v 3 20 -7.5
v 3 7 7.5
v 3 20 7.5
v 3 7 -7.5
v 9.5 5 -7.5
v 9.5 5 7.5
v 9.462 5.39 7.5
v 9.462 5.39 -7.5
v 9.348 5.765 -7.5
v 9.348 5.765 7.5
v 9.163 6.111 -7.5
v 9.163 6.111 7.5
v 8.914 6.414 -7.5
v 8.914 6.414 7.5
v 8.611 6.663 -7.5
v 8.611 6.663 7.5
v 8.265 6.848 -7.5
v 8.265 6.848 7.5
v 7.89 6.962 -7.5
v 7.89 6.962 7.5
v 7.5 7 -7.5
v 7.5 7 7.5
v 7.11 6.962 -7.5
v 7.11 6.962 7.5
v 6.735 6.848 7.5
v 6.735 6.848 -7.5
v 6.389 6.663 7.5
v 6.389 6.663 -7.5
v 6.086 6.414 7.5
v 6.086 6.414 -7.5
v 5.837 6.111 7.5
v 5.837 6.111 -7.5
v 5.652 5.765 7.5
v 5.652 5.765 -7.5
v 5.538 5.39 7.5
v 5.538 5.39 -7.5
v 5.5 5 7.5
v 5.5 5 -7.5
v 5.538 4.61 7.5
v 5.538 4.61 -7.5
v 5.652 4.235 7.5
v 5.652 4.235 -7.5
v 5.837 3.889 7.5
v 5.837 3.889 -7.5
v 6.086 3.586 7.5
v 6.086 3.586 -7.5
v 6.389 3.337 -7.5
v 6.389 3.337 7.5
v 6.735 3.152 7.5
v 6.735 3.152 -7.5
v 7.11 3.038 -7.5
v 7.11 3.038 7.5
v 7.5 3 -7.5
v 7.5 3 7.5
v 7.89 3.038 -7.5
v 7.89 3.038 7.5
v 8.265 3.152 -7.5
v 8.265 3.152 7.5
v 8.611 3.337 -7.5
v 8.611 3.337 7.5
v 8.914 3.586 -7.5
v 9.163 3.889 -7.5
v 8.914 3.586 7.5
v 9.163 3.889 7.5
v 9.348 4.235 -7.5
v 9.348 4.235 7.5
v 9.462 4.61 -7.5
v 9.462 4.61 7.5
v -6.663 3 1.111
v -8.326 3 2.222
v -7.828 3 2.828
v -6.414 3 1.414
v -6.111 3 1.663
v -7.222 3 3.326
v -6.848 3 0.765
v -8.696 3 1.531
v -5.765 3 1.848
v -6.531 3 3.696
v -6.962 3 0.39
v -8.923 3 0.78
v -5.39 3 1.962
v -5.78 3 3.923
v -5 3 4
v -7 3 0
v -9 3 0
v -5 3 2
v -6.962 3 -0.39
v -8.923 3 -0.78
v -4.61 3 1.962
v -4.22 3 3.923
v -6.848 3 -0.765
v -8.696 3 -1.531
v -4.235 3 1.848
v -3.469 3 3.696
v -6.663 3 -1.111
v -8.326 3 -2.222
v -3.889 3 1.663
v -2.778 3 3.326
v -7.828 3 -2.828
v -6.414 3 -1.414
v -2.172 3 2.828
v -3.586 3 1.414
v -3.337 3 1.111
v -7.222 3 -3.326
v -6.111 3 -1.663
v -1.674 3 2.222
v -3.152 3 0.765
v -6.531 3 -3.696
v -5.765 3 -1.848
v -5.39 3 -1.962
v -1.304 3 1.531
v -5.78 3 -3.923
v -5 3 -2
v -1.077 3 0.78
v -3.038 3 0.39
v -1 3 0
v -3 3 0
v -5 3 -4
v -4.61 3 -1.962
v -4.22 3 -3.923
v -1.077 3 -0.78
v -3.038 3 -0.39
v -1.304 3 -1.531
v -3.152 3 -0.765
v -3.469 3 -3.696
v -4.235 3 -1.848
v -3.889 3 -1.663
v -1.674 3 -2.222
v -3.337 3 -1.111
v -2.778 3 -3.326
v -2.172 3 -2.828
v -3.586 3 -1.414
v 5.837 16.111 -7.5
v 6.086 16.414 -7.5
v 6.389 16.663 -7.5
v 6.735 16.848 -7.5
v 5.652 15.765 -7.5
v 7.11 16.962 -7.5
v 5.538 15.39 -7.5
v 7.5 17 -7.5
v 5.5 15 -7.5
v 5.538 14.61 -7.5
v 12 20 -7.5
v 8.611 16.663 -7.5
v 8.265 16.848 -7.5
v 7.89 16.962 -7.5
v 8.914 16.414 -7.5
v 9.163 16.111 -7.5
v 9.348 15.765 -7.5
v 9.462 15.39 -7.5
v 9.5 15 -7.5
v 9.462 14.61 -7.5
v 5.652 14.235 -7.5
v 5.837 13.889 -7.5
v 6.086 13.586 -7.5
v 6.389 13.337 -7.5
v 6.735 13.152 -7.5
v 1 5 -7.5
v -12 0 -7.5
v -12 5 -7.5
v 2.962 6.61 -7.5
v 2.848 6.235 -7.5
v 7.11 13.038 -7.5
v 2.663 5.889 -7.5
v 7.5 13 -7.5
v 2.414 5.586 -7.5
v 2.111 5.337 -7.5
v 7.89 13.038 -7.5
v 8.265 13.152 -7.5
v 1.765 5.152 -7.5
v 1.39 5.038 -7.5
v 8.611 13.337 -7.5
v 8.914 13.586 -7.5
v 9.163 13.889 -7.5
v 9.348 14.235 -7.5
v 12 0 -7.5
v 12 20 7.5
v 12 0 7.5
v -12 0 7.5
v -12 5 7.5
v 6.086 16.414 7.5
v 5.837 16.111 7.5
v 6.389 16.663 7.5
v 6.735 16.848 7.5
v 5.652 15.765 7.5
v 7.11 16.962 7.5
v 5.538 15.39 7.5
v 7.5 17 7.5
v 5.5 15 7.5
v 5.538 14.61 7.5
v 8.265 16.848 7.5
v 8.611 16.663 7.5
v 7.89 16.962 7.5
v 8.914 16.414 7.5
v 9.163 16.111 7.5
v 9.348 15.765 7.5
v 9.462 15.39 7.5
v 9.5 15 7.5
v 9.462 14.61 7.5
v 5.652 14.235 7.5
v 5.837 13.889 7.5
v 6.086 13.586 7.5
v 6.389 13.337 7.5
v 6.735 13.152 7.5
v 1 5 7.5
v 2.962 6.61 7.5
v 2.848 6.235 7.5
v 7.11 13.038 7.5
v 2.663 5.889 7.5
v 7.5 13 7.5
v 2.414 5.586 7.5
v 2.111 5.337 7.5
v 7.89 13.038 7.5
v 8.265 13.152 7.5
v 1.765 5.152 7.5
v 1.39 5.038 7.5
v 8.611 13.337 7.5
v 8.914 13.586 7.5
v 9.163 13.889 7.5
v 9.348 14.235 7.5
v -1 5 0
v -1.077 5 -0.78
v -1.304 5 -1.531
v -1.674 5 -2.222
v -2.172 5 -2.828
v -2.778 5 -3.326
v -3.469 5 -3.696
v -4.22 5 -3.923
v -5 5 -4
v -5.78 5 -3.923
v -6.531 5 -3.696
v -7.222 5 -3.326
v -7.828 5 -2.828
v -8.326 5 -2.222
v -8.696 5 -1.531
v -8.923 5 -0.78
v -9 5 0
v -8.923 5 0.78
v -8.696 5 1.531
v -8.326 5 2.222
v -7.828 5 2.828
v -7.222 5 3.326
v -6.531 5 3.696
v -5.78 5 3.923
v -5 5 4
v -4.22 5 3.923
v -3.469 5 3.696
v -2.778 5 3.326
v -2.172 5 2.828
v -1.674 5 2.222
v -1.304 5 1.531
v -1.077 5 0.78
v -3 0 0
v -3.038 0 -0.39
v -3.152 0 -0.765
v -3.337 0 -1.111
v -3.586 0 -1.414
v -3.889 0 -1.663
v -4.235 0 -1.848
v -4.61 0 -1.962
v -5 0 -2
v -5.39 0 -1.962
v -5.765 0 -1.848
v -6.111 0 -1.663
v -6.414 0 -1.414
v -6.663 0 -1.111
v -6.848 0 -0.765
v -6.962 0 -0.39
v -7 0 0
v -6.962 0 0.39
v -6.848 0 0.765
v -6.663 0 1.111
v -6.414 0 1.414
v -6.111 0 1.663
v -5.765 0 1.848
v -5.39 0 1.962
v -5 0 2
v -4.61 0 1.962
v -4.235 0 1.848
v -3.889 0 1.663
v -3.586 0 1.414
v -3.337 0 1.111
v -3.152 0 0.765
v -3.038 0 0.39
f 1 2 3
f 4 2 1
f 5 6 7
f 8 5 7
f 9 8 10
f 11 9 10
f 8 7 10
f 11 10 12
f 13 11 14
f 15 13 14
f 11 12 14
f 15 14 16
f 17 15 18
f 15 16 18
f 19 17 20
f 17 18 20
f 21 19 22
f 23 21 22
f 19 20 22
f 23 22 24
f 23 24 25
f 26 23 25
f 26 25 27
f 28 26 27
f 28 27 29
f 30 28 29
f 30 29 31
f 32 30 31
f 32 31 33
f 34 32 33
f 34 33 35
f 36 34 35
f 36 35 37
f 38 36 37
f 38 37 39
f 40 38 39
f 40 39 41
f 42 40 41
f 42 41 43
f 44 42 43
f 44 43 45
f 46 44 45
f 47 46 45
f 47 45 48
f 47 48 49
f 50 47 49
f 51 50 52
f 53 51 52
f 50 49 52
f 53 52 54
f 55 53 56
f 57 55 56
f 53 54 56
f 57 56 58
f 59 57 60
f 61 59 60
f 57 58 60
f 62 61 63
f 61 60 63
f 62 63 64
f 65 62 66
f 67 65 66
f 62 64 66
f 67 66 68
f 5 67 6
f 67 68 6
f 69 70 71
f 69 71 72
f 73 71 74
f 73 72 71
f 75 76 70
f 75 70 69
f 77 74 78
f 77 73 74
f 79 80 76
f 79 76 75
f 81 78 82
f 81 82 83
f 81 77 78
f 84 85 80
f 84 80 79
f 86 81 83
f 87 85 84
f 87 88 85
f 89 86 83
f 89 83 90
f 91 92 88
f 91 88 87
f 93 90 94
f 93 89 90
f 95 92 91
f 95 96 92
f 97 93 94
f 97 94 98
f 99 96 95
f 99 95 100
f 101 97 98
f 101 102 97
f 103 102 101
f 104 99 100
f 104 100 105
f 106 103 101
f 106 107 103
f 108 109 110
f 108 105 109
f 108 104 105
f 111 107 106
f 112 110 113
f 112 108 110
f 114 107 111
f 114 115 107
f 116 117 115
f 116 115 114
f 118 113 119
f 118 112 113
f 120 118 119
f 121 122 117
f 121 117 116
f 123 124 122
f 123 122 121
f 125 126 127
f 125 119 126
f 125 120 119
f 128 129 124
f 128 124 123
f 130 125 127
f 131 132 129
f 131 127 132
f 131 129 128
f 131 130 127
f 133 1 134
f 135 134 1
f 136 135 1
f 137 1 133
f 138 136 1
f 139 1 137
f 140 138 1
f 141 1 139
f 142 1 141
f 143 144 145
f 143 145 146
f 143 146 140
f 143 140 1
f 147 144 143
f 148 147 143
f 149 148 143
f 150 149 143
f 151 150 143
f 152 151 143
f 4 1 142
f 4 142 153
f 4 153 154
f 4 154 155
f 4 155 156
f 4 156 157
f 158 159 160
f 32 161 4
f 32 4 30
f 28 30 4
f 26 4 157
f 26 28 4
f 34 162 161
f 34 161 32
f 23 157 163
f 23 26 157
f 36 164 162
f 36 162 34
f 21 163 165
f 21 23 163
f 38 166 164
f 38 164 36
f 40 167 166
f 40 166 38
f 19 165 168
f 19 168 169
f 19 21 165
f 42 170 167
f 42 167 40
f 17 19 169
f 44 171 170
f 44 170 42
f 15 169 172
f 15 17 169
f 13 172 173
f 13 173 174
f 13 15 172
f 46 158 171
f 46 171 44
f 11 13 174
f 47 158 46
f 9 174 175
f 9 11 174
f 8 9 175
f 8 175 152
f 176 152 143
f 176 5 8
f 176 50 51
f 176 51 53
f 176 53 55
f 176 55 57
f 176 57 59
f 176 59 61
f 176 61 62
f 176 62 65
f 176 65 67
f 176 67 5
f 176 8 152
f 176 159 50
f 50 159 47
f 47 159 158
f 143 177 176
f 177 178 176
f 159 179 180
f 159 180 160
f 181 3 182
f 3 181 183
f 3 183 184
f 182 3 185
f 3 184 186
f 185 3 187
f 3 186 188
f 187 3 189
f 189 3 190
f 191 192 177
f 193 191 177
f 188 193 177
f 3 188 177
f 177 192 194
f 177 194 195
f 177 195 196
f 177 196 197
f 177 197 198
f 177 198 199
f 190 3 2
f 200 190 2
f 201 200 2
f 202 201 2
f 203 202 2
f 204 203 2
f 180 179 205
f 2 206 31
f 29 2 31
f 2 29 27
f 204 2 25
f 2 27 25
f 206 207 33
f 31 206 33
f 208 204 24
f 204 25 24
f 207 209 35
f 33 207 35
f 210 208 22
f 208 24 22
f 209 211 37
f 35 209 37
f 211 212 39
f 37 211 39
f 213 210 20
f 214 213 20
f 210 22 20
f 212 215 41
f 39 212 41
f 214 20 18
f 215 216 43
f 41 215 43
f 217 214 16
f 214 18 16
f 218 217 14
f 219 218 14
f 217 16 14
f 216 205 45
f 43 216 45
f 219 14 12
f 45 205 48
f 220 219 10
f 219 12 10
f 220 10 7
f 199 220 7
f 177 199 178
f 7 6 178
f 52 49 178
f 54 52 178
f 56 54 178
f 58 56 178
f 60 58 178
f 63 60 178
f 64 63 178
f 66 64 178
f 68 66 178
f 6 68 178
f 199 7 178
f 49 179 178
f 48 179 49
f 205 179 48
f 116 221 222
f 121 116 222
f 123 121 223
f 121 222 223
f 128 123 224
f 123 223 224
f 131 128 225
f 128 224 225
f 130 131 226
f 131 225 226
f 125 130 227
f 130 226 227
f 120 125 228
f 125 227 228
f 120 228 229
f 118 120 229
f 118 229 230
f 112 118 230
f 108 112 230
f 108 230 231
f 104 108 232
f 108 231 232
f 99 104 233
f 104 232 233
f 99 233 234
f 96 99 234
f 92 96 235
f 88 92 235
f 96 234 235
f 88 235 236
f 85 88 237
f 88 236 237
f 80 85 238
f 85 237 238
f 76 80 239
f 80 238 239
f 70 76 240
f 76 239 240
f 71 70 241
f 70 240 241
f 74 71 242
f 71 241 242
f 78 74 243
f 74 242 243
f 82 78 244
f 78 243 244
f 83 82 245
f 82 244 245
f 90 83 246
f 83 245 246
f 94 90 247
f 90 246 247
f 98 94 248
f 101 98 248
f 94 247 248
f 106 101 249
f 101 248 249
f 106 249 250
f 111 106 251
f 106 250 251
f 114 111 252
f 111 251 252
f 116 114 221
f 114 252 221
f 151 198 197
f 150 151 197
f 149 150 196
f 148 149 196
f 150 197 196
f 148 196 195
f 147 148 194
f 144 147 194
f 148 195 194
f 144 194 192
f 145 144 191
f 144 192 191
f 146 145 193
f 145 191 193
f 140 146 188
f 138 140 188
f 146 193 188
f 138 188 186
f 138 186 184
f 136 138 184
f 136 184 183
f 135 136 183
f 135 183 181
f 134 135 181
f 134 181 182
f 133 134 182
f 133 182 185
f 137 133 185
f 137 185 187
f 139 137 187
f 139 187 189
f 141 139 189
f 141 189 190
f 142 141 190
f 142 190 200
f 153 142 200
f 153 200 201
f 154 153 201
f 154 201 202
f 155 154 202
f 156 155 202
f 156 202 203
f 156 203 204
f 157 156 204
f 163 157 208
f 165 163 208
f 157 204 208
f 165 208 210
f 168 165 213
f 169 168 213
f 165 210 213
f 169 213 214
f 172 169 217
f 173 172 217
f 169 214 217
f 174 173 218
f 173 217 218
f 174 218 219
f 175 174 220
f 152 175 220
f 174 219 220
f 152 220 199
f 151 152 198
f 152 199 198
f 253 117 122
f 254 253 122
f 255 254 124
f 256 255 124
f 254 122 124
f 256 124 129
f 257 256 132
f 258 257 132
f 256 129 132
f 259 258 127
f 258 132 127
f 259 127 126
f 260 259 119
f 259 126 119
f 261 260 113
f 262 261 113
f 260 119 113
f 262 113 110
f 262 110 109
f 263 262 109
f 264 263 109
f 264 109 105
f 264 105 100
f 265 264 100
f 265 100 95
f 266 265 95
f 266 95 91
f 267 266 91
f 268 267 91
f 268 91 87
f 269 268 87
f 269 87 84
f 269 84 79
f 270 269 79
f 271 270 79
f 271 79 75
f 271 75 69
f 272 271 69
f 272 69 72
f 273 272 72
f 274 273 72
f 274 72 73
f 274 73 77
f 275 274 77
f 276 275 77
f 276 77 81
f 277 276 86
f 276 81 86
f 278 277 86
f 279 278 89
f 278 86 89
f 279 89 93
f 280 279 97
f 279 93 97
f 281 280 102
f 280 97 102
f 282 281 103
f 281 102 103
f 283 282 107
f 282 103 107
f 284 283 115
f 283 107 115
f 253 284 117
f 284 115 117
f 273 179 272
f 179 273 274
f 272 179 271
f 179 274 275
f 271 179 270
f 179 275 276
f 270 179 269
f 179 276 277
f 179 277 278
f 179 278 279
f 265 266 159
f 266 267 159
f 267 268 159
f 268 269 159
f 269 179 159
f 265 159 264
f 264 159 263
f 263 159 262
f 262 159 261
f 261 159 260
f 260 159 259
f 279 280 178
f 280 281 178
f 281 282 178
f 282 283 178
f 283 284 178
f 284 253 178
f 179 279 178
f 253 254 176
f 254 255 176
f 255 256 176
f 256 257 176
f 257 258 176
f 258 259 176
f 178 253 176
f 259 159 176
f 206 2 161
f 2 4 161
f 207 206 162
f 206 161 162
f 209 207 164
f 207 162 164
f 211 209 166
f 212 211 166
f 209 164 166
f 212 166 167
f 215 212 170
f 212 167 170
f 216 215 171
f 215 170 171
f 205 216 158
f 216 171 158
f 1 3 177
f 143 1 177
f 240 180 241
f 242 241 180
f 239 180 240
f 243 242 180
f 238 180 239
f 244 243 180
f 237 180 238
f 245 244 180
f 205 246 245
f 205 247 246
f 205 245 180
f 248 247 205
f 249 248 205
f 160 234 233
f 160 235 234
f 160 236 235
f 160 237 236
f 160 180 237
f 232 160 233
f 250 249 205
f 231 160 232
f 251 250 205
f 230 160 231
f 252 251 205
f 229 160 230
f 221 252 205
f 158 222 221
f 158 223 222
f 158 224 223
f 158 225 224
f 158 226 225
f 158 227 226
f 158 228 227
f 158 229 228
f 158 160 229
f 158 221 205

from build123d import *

# Parameters (mm, degrees)
SKETCH1_W           = 24
SKETCH1_H           = 15
BOSS_EXTRUDE2_DEPTH = 5
SKETCH8_W           = 9
SKETCH8_H           = 15
BOSS_EXTRUDE3_DEPTH = 15
CUT_EXTRUDE3_REACH  = 7
SKETCH10_R          = 2
SKETCH9_R           = 4
CUT_EXTRUDE4_DEPTH  = 2
CUT_EXTRUDE5_REACH  = 17
SKETCH11_R          = 2
FILLET4_R           = 2


with BuildPart() as part:
    # Sketch1 → Boss-Extrude2 (new body)
    with BuildSketch(Plane(origin=(0, 0, 0), x_dir=(1, 0, 0), z_dir=(0, 1, 0))):
        Rectangle(SKETCH1_W, SKETCH1_H)
    extrude(amount=BOSS_EXTRUDE2_DEPTH)

    # Sketch8 → Boss-Extrude3 (add)
    with BuildSketch(Plane(origin=(0, 5, 0), x_dir=(1, 0, 0), z_dir=(0, 1, 0))):
        with Locations((7.5, 0)):
            Rectangle(SKETCH8_W, SKETCH8_H)
    extrude(amount=BOSS_EXTRUDE3_DEPTH)

    # Sketch10 → Cut-Extrude3 (cut, up to next)
    with BuildSketch(Plane(origin=(0, 5, 0), x_dir=(1, 0, 0), z_dir=(0, 1, 0)), mode=Mode.PRIVATE) as cut_extrude3_sk1:
        with Locations((-5, 0)):
            Circle(SKETCH10_R)
    cut_extrude3_tool1 = extrude(cut_extrude3_sk1.sketch, amount=-CUT_EXTRUDE3_REACH, mode=Mode.PRIVATE) & part.part
    add(cut_extrude3_tool1.solids().sort_by_distance((-5, 5, 0))[0], mode=Mode.SUBTRACT)

    # Sketch9 → Cut-Extrude4 (cut)
    with BuildSketch(Plane(origin=(0, 5, 0), x_dir=(1, 0, 0), z_dir=(0, 1, 0))):
        with Locations((-5, 0)):
            Circle(SKETCH9_R)
    extrude(amount=-CUT_EXTRUDE4_DEPTH, mode=Mode.SUBTRACT)

    # Sketch11 → Cut-Extrude5 (cut, up to next)
    with BuildSketch(Plane.XY.offset(7.5), mode=Mode.PRIVATE) as cut_extrude5_sk1:
        with Locations((7.5, 15)):
            Circle(SKETCH11_R)
    cut_extrude5_tool1 = extrude(cut_extrude5_sk1.sketch, amount=-CUT_EXTRUDE5_REACH, mode=Mode.PRIVATE) & part.part
    add(cut_extrude5_tool1.solids().sort_by_distance((7.5, 15, 7.5))[0], mode=Mode.SUBTRACT)
    # Sketch11 → Cut-Extrude5 (cut, up to next)
    with BuildSketch(Plane.XY.offset(7.5), mode=Mode.PRIVATE) as cut_extrude5_sk2:
        with Locations((7.5, 5)):
            Circle(SKETCH11_R)
    cut_extrude5_tool2 = extrude(cut_extrude5_sk2.sketch, amount=-CUT_EXTRUDE5_REACH, mode=Mode.PRIVATE) & part.part
    add(cut_extrude5_tool2.solids().sort_by_distance((7.5, 5, 7.5))[0], mode=Mode.SUBTRACT)

    # Fillet4
    fillet4_edges = [part.edges().sort_by_distance(p)[0] for p in [
        (3, 5, 0),
    ]]
    fillet(fillet4_edges, radius=FILLET4_R)


solid = part.part
